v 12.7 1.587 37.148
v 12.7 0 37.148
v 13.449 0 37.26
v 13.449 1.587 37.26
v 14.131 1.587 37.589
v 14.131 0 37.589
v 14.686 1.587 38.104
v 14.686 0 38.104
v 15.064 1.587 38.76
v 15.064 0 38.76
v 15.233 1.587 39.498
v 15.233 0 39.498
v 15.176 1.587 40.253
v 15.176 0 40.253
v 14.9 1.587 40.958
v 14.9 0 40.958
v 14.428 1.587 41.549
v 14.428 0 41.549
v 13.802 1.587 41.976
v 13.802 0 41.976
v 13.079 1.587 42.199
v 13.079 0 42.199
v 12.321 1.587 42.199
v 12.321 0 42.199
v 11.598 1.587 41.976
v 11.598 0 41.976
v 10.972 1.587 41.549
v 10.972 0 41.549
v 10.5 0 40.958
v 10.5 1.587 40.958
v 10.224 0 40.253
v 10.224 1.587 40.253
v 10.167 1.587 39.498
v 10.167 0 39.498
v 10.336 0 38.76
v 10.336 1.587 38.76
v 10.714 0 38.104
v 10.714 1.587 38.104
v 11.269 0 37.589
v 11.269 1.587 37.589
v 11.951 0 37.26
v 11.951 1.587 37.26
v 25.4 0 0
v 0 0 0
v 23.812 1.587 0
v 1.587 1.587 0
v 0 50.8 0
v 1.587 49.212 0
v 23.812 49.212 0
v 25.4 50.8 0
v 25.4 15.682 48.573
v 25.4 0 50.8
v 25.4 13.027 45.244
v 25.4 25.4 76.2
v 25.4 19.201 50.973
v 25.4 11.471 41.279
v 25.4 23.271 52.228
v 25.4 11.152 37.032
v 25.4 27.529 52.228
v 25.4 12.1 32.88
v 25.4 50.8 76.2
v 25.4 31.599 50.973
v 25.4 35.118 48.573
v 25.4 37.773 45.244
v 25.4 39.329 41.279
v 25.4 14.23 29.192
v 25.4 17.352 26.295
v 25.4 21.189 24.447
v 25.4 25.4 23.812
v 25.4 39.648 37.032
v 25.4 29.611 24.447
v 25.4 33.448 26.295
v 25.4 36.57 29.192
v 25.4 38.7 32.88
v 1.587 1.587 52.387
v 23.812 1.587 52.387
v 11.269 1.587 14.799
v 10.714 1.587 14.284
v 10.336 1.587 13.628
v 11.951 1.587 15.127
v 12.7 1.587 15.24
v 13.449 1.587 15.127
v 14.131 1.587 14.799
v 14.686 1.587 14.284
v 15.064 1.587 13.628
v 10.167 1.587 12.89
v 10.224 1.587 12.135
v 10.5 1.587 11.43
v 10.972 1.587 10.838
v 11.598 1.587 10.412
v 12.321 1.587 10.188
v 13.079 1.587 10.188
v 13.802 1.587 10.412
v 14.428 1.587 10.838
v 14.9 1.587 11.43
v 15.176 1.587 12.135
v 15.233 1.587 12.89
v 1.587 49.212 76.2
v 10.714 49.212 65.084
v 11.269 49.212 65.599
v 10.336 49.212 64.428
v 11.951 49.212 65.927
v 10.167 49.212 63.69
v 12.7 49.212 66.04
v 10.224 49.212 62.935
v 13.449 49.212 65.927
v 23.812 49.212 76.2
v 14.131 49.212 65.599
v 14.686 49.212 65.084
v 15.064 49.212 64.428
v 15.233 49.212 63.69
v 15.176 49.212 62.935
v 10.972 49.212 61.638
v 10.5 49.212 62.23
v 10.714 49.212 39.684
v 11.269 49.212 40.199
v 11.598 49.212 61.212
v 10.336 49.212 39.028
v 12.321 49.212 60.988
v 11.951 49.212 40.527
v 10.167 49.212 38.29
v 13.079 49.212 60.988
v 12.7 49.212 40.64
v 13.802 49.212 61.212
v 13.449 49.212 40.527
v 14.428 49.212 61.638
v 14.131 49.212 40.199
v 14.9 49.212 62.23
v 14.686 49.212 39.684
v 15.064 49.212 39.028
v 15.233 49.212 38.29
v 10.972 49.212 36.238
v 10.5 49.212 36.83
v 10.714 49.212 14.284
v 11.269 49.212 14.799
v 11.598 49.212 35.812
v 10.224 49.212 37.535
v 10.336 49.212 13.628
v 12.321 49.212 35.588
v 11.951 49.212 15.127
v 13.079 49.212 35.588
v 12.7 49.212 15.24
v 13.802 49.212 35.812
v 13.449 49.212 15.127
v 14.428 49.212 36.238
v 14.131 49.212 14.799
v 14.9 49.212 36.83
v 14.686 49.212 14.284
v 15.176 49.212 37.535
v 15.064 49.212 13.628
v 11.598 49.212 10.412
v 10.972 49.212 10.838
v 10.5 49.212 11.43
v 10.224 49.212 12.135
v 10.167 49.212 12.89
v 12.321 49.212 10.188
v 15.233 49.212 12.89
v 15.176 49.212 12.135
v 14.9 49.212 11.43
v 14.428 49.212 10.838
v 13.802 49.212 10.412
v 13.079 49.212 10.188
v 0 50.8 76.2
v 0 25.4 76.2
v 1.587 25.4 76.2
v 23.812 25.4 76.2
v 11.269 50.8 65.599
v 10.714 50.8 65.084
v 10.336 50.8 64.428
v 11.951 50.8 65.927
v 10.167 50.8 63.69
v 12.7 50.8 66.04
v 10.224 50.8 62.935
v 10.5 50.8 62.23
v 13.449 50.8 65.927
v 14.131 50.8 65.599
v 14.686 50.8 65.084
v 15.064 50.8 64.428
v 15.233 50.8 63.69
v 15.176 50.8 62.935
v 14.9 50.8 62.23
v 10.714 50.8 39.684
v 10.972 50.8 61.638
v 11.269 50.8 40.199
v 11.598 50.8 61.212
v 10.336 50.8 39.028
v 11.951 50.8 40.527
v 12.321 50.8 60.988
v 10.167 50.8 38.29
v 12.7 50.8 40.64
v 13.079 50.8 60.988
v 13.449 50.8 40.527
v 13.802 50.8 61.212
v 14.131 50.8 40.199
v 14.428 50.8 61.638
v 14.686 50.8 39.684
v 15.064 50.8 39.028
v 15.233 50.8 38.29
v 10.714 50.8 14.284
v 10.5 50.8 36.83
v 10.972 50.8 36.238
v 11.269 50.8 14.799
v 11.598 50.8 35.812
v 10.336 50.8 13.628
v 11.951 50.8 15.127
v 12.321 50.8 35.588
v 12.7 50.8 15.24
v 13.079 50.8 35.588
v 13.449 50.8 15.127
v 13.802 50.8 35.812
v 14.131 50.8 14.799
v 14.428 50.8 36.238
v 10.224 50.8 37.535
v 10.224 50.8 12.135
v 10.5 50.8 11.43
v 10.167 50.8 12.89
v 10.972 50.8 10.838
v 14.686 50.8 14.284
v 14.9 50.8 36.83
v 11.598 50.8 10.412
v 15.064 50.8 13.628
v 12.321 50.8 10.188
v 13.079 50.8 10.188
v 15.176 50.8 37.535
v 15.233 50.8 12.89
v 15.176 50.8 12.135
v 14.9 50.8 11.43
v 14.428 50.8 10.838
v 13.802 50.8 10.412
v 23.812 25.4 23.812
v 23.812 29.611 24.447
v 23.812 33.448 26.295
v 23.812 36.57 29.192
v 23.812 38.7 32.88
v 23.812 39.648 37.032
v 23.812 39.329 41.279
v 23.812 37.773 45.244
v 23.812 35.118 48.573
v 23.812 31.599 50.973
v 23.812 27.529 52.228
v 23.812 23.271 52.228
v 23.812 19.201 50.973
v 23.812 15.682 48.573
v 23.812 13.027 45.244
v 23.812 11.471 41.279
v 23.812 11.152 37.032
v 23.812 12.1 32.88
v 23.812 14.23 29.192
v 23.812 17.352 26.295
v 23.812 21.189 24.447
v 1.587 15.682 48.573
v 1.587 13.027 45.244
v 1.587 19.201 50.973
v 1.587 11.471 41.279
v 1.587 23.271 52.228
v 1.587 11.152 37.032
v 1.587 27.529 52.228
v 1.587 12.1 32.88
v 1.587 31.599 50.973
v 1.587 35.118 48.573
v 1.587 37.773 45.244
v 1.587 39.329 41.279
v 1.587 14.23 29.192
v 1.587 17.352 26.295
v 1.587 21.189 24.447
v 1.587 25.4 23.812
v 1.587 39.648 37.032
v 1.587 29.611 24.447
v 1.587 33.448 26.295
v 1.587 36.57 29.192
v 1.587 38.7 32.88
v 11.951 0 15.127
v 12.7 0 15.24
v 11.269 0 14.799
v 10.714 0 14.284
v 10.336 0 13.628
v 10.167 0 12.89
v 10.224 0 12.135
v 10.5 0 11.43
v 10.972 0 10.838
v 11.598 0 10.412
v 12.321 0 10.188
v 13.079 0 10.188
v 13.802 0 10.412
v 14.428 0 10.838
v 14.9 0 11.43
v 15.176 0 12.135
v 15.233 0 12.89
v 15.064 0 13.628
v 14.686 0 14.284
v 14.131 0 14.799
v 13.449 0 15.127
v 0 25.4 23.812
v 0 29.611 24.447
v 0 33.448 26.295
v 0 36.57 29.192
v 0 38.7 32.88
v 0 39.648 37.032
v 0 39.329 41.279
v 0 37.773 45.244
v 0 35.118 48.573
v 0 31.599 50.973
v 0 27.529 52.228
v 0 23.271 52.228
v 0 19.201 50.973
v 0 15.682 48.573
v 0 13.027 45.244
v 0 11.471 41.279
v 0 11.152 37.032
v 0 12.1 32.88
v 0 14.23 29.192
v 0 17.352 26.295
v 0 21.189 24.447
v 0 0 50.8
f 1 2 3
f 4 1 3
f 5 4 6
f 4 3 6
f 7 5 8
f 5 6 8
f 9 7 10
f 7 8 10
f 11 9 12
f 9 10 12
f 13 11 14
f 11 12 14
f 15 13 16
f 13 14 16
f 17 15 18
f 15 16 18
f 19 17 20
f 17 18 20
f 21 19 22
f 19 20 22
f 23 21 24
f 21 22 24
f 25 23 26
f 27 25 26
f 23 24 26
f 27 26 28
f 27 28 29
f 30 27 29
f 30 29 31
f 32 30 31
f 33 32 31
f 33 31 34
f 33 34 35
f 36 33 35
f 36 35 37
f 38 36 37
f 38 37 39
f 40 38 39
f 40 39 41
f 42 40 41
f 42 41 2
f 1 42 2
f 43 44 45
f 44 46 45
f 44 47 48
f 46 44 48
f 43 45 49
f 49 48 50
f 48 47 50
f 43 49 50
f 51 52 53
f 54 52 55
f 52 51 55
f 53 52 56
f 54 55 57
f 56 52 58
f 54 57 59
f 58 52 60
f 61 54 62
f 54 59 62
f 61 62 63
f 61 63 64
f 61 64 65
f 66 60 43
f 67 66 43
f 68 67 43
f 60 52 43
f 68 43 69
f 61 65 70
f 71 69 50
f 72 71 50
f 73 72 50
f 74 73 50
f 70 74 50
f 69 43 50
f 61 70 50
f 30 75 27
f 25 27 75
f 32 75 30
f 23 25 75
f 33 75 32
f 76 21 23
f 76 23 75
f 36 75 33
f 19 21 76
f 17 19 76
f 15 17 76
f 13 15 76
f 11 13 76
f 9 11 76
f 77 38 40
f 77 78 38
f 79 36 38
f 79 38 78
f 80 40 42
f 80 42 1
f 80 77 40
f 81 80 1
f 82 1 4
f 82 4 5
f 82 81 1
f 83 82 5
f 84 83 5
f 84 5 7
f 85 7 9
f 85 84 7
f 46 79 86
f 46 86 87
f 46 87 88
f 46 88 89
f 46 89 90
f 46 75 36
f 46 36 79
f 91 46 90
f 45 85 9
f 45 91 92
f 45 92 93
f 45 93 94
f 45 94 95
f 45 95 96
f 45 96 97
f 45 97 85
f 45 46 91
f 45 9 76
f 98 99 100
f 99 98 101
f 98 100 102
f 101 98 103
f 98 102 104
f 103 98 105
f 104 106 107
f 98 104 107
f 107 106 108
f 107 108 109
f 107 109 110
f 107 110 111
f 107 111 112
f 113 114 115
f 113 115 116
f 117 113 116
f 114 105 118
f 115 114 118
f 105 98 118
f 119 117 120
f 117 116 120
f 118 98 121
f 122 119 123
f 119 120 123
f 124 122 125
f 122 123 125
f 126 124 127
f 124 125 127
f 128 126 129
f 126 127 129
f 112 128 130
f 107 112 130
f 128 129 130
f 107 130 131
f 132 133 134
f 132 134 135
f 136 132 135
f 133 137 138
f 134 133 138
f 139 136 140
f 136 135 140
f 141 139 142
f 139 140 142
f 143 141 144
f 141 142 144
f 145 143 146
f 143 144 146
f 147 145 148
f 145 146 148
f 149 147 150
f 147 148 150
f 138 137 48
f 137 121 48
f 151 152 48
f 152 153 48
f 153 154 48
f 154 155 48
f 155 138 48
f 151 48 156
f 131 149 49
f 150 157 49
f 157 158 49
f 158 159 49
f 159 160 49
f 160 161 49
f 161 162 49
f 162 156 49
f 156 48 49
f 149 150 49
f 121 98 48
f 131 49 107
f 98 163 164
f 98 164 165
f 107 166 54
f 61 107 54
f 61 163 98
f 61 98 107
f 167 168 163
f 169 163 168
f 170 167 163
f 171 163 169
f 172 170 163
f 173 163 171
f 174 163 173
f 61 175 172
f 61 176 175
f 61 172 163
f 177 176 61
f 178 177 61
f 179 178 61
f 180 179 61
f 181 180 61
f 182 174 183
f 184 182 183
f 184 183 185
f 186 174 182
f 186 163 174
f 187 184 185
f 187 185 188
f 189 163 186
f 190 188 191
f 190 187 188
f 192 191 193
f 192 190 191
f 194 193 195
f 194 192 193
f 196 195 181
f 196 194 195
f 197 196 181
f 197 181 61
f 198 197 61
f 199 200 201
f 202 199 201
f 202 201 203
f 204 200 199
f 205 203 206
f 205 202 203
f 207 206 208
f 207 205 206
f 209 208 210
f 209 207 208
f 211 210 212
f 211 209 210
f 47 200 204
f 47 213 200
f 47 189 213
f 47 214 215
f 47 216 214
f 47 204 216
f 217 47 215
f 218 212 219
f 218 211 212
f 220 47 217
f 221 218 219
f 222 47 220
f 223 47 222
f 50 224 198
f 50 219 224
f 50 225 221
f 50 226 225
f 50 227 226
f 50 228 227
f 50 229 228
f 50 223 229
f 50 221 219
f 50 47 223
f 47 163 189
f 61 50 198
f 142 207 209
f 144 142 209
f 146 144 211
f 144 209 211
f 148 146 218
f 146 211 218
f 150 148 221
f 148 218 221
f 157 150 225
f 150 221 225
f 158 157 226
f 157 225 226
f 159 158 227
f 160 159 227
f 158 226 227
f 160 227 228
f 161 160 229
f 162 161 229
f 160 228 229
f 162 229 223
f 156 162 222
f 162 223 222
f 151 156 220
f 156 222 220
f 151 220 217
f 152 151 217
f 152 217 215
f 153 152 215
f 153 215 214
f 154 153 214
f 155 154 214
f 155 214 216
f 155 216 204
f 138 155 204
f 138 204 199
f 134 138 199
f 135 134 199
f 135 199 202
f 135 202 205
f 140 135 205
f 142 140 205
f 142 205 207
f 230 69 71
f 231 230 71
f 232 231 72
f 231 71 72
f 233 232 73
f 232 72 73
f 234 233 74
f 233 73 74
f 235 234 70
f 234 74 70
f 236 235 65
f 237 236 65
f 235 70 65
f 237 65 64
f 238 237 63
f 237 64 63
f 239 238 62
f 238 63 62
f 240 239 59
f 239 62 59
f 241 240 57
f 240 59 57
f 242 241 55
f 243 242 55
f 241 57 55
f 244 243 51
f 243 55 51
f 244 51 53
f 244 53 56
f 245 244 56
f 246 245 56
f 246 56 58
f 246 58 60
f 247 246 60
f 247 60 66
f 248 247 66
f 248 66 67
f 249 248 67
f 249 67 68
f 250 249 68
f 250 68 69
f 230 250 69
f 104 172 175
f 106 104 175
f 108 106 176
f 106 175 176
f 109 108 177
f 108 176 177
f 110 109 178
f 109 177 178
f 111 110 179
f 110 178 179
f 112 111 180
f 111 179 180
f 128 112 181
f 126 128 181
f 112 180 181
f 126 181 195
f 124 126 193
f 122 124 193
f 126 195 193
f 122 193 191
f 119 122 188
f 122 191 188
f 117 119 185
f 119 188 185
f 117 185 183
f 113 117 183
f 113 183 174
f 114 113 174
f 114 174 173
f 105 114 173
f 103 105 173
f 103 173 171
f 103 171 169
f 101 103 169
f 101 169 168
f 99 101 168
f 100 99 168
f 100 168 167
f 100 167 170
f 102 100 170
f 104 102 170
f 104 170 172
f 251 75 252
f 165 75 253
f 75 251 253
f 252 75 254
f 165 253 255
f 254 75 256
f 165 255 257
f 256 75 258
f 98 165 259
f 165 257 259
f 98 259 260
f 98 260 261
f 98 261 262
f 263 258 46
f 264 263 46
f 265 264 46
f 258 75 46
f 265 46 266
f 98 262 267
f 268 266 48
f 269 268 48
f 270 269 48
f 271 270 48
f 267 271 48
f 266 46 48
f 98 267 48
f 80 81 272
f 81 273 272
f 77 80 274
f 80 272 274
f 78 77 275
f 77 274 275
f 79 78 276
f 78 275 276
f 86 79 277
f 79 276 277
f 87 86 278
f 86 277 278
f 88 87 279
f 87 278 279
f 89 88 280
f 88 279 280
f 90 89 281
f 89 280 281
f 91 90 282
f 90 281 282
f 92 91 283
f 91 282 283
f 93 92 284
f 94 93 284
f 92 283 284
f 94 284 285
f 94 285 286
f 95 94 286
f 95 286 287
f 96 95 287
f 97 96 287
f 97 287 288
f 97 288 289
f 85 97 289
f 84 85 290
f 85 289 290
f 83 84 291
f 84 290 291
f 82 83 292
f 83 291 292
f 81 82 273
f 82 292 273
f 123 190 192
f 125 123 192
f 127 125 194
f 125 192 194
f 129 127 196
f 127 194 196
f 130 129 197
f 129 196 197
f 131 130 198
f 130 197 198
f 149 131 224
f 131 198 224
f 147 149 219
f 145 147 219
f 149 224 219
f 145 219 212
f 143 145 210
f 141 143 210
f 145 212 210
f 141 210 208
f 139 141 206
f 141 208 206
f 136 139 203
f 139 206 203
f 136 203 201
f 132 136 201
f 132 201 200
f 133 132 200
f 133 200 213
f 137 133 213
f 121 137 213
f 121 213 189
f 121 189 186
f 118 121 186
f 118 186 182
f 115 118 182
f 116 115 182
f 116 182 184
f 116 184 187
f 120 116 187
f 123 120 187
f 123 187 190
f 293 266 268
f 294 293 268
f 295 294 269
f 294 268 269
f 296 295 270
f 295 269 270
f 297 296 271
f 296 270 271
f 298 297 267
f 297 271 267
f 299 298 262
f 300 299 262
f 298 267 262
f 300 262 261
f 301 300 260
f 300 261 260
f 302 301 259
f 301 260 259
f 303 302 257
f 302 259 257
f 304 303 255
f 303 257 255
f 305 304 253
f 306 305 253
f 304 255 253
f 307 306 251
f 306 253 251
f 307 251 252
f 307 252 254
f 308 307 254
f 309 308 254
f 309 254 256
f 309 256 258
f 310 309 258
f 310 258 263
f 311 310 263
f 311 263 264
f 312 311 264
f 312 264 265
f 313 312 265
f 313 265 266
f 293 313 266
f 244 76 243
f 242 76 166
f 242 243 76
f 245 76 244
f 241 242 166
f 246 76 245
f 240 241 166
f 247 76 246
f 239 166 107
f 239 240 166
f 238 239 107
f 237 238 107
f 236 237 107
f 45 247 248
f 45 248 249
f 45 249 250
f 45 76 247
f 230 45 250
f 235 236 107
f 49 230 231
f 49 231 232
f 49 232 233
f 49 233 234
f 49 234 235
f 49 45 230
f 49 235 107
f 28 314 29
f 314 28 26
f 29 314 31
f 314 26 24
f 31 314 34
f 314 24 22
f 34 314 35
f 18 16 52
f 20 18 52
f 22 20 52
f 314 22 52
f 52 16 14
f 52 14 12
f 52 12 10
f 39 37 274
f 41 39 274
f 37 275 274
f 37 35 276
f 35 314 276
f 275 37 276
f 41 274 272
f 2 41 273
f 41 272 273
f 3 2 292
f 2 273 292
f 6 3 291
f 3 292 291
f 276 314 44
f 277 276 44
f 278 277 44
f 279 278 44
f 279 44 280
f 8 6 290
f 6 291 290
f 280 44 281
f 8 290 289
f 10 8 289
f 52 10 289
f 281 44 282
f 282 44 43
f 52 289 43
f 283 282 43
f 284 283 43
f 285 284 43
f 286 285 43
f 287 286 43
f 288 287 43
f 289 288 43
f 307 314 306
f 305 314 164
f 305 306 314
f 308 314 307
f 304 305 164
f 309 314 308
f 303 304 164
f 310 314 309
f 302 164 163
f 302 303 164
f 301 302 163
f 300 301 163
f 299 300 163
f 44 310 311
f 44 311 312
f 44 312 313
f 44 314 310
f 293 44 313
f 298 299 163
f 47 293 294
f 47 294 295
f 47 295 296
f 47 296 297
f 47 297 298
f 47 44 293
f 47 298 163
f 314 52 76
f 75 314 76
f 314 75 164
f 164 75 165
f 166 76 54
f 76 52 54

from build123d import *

# Parameters (mm, degrees)
SKETCH1_W           = 25.4
SKETCH1_H           = 50.8
SKETCH1_W_2         = 22.225
SKETCH1_H_2         = 47.625
BOSS_EXTRUDE1_DEPTH = 76.2
SKETCH2_R           = 14.2875
CUT_EXTRUDE1_DEPTH  = 96.038097624
CUT_EXTRUDE2_DEPTH  = 96.038097624
CUT_EXTRUDE3_REACH  = 97.038
SKETCH4_R           = 2.54
CUT_EXTRUDE4_REACH  = 97.038
SKETCH5_R           = 2.54


with BuildPart() as part:
    # Sketch1 → Boss-Extrude1 (new body)
    with BuildSketch(Plane.XY):
        with Locations((12.7, 25.4)):
            Rectangle(SKETCH1_W, SKETCH1_H)
        with Locations((12.7, 25.4)):
            Rectangle(SKETCH1_W_2, SKETCH1_H_2, mode=Mode.SUBTRACT)
    extrude(amount=BOSS_EXTRUDE1_DEPTH)

    # Sketch2 → Cut-Extrude1 (cut, through all)
    with BuildSketch(Plane(origin=(25.4, 0, 0), x_dir=(0, 0, -1), z_dir=(1, 0, 0))):
        with Locations((-38.1, 25.4)):
            Circle(SKETCH2_R)
    extrude(amount=-CUT_EXTRUDE1_DEPTH, mode=Mode.SUBTRACT)

    # Sketch3 → Cut-Extrude2 (cut, through all)
    with BuildSketch(Plane(origin=(25.4, 0, 0), x_dir=(0, 0, -1), z_dir=(1, 0, 0))):
        Polygon((-50.8, 0), (-76.2, 25.4), (-76.2, 0), align=None)
    extrude(amount=-CUT_EXTRUDE2_DEPTH, mode=Mode.SUBTRACT)

    # Sketch4 → Cut-Extrude3 (cut, up to next)
    with BuildSketch(Plane(origin=(0, 50.8, 0), x_dir=(1, 0, 0), z_dir=(0, 1, 0)), mode=Mode.PRIVATE) as cut_extrude3_sk1:
        with Locations(Location((12.7, -12.7, 0), (0, 0, 270))):
            Circle(SKETCH4_R)
    cut_extrude3_tool1 = extrude(cut_extrude3_sk1.sketch, amount=-CUT_EXTRUDE3_REACH, mode=Mode.PRIVATE) & part.part
    # Sketch4 → Cut-Extrude3 (cut, up to next)
    with BuildSketch(Plane(origin=(0, 50.8, 0), x_dir=(1, 0, 0), z_dir=(0, 1, 0)), mode=Mode.PRIVATE) as cut_extrude3_sk2:
        with Locations(Location((12.7, -38.1, 0), (0, 0, 270))):
            Circle(SKETCH4_R)
    cut_extrude3_tool2 = extrude(cut_extrude3_sk2.sketch, amount=-CUT_EXTRUDE3_REACH, mode=Mode.PRIVATE) & part.part
    # Sketch4 → Cut-Extrude3 (cut, up to next)
    with BuildSketch(Plane(origin=(0, 50.8, 0), x_dir=(1, 0, 0), z_dir=(0, 1, 0)), mode=Mode.PRIVATE) as cut_extrude3_sk3:
        with Locations(Location((12.7, -63.5, 0), (0, 0, 270))):
            Circle(SKETCH4_R)
    cut_extrude3_tool3 = extrude(cut_extrude3_sk3.sketch, amount=-CUT_EXTRUDE3_REACH, mode=Mode.PRIVATE) & part.part
    add(cut_extrude3_tool1.solids().sort_by_distance((12.7, 50.8, 12.7))[0], mode=Mode.SUBTRACT)
    add(cut_extrude3_tool2.solids().sort_by_distance((12.7, 50.8, 38.1))[0], mode=Mode.SUBTRACT)
    add(cut_extrude3_tool3.solids().sort_by_distance((12.7, 50.8, 63.5))[0], mode=Mode.SUBTRACT)

    # Sketch5 → Cut-Extrude4 (cut, up to next)
    with BuildSketch(Plane.XZ, mode=Mode.PRIVATE) as cut_extrude4_sk1:
        with Locations(Location((12.7, 12.7, 0), (0, 0, 90))):
            Circle(SKETCH5_R)
    cut_extrude4_tool1 = extrude(cut_extrude4_sk1.sketch, amount=-CUT_EXTRUDE4_REACH, mode=Mode.PRIVATE) & part.part
    # Sketch5 → Cut-Extrude4 (cut, up to next)
    with BuildSketch(Plane.XZ, mode=Mode.PRIVATE) as cut_extrude4_sk2:
        with Locations(Location((12.7, 39.6875, 0), (0, 0, 270))):
            Circle(SKETCH5_R)
    cut_extrude4_tool2 = extrude(cut_extrude4_sk2.sketch, amount=-CUT_EXTRUDE4_REACH, mode=Mode.PRIVATE) & part.part
    add(cut_extrude4_tool1.solids().sort_by_distance((12.7, 0, 12.7))[0], mode=Mode.SUBTRACT)
    add(cut_extrude4_tool2.solids().sort_by_distance((12.7, 0, 39.6875))[0], mode=Mode.SUBTRACT)


solid = part.part
